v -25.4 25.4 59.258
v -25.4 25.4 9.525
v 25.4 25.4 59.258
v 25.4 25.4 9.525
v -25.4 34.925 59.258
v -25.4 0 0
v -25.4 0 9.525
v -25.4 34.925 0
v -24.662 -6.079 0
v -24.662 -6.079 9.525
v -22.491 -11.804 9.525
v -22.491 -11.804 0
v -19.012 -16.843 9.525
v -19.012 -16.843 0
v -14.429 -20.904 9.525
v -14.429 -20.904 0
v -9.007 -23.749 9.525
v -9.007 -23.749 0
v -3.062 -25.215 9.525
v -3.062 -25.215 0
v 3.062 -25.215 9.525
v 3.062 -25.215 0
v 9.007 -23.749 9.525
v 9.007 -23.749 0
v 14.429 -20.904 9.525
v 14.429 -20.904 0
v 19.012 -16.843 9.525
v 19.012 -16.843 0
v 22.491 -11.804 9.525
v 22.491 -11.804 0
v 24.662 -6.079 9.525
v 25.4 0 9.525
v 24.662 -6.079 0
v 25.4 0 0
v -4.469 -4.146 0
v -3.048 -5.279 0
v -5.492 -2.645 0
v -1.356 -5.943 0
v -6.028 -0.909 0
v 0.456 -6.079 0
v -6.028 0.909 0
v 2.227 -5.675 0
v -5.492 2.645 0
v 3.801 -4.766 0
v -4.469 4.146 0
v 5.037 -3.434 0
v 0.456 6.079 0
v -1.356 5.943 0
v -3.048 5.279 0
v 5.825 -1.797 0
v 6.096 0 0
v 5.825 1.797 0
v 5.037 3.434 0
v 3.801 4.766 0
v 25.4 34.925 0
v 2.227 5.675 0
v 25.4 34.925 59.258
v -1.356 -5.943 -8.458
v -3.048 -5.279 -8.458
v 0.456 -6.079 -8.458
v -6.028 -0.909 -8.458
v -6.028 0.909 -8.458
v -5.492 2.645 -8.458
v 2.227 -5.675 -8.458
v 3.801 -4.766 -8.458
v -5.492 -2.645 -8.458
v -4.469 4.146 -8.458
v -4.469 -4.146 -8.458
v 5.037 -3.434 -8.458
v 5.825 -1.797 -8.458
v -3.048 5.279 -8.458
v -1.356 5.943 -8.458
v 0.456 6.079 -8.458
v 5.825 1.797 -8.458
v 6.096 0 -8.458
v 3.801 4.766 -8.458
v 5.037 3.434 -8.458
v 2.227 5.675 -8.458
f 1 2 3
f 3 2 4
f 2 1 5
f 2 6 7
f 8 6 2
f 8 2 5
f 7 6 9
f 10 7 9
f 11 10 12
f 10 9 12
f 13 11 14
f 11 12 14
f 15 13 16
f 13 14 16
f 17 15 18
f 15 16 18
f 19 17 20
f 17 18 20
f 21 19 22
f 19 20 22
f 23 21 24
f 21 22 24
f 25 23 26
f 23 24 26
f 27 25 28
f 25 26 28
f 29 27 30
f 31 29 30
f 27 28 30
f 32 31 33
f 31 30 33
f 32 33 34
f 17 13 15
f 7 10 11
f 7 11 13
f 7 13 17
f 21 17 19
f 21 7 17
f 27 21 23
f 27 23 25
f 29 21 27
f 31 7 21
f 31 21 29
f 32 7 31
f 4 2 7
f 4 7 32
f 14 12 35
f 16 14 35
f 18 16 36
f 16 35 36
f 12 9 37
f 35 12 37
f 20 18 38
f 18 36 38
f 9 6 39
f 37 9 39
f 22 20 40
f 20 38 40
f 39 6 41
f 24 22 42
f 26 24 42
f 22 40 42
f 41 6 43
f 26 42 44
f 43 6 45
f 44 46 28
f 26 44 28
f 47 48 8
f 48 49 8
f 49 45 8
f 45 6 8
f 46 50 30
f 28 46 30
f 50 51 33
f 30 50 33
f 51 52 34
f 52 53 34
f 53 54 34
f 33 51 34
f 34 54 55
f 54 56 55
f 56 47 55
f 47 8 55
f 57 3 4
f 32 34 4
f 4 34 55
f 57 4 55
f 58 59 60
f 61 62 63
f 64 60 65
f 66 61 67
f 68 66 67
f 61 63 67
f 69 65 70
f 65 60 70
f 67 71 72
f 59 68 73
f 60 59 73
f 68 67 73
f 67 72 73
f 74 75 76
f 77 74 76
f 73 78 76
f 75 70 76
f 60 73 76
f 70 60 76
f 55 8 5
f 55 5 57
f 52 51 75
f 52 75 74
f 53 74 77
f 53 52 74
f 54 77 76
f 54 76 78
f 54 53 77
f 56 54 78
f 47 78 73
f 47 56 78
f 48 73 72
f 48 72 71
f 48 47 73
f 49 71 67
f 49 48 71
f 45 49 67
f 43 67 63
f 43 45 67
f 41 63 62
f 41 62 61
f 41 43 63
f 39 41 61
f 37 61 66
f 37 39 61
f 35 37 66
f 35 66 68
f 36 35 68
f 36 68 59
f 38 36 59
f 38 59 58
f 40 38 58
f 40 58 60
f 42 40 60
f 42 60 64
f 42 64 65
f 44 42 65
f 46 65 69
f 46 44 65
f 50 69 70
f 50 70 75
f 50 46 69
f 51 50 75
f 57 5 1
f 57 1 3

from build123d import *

# Parameters (mm, degrees)
F1_DEPTH = 9.525
F0_W     = 50.8
F0_H     = 9.525
F2_DEPTH = 59.2582
F3_R     = 6.096
F4_DEPTH = 8.4582


with BuildPart() as f1:
    # F0 (on Top) → F1 (new body)
    with BuildSketch(Plane.XY):
        with BuildLine():
            Line((25.4, 25.4), (-25.4, 25.4))
            Line((-25.4, 25.4), (-25.4, 0))
            ThreePointArc((-25.4, 0), (0, -25.4), (25.4, 0))
            Line((25.4, 0), (25.4, 25.4))
        make_face()
    extrude(amount=F1_DEPTH)

    # F0 (on Top) → F2 (join)
    with BuildSketch(Plane.XY):
        with Locations((0, 30.1625)):
            Rectangle(F0_W, F0_H)
    extrude(amount=F2_DEPTH)

    # F3 (on face) → F4 (join)
    with BuildSketch(Plane.XY):
        Circle(F3_R)
    extrude(amount=-F4_DEPTH)


solid = f1.part
